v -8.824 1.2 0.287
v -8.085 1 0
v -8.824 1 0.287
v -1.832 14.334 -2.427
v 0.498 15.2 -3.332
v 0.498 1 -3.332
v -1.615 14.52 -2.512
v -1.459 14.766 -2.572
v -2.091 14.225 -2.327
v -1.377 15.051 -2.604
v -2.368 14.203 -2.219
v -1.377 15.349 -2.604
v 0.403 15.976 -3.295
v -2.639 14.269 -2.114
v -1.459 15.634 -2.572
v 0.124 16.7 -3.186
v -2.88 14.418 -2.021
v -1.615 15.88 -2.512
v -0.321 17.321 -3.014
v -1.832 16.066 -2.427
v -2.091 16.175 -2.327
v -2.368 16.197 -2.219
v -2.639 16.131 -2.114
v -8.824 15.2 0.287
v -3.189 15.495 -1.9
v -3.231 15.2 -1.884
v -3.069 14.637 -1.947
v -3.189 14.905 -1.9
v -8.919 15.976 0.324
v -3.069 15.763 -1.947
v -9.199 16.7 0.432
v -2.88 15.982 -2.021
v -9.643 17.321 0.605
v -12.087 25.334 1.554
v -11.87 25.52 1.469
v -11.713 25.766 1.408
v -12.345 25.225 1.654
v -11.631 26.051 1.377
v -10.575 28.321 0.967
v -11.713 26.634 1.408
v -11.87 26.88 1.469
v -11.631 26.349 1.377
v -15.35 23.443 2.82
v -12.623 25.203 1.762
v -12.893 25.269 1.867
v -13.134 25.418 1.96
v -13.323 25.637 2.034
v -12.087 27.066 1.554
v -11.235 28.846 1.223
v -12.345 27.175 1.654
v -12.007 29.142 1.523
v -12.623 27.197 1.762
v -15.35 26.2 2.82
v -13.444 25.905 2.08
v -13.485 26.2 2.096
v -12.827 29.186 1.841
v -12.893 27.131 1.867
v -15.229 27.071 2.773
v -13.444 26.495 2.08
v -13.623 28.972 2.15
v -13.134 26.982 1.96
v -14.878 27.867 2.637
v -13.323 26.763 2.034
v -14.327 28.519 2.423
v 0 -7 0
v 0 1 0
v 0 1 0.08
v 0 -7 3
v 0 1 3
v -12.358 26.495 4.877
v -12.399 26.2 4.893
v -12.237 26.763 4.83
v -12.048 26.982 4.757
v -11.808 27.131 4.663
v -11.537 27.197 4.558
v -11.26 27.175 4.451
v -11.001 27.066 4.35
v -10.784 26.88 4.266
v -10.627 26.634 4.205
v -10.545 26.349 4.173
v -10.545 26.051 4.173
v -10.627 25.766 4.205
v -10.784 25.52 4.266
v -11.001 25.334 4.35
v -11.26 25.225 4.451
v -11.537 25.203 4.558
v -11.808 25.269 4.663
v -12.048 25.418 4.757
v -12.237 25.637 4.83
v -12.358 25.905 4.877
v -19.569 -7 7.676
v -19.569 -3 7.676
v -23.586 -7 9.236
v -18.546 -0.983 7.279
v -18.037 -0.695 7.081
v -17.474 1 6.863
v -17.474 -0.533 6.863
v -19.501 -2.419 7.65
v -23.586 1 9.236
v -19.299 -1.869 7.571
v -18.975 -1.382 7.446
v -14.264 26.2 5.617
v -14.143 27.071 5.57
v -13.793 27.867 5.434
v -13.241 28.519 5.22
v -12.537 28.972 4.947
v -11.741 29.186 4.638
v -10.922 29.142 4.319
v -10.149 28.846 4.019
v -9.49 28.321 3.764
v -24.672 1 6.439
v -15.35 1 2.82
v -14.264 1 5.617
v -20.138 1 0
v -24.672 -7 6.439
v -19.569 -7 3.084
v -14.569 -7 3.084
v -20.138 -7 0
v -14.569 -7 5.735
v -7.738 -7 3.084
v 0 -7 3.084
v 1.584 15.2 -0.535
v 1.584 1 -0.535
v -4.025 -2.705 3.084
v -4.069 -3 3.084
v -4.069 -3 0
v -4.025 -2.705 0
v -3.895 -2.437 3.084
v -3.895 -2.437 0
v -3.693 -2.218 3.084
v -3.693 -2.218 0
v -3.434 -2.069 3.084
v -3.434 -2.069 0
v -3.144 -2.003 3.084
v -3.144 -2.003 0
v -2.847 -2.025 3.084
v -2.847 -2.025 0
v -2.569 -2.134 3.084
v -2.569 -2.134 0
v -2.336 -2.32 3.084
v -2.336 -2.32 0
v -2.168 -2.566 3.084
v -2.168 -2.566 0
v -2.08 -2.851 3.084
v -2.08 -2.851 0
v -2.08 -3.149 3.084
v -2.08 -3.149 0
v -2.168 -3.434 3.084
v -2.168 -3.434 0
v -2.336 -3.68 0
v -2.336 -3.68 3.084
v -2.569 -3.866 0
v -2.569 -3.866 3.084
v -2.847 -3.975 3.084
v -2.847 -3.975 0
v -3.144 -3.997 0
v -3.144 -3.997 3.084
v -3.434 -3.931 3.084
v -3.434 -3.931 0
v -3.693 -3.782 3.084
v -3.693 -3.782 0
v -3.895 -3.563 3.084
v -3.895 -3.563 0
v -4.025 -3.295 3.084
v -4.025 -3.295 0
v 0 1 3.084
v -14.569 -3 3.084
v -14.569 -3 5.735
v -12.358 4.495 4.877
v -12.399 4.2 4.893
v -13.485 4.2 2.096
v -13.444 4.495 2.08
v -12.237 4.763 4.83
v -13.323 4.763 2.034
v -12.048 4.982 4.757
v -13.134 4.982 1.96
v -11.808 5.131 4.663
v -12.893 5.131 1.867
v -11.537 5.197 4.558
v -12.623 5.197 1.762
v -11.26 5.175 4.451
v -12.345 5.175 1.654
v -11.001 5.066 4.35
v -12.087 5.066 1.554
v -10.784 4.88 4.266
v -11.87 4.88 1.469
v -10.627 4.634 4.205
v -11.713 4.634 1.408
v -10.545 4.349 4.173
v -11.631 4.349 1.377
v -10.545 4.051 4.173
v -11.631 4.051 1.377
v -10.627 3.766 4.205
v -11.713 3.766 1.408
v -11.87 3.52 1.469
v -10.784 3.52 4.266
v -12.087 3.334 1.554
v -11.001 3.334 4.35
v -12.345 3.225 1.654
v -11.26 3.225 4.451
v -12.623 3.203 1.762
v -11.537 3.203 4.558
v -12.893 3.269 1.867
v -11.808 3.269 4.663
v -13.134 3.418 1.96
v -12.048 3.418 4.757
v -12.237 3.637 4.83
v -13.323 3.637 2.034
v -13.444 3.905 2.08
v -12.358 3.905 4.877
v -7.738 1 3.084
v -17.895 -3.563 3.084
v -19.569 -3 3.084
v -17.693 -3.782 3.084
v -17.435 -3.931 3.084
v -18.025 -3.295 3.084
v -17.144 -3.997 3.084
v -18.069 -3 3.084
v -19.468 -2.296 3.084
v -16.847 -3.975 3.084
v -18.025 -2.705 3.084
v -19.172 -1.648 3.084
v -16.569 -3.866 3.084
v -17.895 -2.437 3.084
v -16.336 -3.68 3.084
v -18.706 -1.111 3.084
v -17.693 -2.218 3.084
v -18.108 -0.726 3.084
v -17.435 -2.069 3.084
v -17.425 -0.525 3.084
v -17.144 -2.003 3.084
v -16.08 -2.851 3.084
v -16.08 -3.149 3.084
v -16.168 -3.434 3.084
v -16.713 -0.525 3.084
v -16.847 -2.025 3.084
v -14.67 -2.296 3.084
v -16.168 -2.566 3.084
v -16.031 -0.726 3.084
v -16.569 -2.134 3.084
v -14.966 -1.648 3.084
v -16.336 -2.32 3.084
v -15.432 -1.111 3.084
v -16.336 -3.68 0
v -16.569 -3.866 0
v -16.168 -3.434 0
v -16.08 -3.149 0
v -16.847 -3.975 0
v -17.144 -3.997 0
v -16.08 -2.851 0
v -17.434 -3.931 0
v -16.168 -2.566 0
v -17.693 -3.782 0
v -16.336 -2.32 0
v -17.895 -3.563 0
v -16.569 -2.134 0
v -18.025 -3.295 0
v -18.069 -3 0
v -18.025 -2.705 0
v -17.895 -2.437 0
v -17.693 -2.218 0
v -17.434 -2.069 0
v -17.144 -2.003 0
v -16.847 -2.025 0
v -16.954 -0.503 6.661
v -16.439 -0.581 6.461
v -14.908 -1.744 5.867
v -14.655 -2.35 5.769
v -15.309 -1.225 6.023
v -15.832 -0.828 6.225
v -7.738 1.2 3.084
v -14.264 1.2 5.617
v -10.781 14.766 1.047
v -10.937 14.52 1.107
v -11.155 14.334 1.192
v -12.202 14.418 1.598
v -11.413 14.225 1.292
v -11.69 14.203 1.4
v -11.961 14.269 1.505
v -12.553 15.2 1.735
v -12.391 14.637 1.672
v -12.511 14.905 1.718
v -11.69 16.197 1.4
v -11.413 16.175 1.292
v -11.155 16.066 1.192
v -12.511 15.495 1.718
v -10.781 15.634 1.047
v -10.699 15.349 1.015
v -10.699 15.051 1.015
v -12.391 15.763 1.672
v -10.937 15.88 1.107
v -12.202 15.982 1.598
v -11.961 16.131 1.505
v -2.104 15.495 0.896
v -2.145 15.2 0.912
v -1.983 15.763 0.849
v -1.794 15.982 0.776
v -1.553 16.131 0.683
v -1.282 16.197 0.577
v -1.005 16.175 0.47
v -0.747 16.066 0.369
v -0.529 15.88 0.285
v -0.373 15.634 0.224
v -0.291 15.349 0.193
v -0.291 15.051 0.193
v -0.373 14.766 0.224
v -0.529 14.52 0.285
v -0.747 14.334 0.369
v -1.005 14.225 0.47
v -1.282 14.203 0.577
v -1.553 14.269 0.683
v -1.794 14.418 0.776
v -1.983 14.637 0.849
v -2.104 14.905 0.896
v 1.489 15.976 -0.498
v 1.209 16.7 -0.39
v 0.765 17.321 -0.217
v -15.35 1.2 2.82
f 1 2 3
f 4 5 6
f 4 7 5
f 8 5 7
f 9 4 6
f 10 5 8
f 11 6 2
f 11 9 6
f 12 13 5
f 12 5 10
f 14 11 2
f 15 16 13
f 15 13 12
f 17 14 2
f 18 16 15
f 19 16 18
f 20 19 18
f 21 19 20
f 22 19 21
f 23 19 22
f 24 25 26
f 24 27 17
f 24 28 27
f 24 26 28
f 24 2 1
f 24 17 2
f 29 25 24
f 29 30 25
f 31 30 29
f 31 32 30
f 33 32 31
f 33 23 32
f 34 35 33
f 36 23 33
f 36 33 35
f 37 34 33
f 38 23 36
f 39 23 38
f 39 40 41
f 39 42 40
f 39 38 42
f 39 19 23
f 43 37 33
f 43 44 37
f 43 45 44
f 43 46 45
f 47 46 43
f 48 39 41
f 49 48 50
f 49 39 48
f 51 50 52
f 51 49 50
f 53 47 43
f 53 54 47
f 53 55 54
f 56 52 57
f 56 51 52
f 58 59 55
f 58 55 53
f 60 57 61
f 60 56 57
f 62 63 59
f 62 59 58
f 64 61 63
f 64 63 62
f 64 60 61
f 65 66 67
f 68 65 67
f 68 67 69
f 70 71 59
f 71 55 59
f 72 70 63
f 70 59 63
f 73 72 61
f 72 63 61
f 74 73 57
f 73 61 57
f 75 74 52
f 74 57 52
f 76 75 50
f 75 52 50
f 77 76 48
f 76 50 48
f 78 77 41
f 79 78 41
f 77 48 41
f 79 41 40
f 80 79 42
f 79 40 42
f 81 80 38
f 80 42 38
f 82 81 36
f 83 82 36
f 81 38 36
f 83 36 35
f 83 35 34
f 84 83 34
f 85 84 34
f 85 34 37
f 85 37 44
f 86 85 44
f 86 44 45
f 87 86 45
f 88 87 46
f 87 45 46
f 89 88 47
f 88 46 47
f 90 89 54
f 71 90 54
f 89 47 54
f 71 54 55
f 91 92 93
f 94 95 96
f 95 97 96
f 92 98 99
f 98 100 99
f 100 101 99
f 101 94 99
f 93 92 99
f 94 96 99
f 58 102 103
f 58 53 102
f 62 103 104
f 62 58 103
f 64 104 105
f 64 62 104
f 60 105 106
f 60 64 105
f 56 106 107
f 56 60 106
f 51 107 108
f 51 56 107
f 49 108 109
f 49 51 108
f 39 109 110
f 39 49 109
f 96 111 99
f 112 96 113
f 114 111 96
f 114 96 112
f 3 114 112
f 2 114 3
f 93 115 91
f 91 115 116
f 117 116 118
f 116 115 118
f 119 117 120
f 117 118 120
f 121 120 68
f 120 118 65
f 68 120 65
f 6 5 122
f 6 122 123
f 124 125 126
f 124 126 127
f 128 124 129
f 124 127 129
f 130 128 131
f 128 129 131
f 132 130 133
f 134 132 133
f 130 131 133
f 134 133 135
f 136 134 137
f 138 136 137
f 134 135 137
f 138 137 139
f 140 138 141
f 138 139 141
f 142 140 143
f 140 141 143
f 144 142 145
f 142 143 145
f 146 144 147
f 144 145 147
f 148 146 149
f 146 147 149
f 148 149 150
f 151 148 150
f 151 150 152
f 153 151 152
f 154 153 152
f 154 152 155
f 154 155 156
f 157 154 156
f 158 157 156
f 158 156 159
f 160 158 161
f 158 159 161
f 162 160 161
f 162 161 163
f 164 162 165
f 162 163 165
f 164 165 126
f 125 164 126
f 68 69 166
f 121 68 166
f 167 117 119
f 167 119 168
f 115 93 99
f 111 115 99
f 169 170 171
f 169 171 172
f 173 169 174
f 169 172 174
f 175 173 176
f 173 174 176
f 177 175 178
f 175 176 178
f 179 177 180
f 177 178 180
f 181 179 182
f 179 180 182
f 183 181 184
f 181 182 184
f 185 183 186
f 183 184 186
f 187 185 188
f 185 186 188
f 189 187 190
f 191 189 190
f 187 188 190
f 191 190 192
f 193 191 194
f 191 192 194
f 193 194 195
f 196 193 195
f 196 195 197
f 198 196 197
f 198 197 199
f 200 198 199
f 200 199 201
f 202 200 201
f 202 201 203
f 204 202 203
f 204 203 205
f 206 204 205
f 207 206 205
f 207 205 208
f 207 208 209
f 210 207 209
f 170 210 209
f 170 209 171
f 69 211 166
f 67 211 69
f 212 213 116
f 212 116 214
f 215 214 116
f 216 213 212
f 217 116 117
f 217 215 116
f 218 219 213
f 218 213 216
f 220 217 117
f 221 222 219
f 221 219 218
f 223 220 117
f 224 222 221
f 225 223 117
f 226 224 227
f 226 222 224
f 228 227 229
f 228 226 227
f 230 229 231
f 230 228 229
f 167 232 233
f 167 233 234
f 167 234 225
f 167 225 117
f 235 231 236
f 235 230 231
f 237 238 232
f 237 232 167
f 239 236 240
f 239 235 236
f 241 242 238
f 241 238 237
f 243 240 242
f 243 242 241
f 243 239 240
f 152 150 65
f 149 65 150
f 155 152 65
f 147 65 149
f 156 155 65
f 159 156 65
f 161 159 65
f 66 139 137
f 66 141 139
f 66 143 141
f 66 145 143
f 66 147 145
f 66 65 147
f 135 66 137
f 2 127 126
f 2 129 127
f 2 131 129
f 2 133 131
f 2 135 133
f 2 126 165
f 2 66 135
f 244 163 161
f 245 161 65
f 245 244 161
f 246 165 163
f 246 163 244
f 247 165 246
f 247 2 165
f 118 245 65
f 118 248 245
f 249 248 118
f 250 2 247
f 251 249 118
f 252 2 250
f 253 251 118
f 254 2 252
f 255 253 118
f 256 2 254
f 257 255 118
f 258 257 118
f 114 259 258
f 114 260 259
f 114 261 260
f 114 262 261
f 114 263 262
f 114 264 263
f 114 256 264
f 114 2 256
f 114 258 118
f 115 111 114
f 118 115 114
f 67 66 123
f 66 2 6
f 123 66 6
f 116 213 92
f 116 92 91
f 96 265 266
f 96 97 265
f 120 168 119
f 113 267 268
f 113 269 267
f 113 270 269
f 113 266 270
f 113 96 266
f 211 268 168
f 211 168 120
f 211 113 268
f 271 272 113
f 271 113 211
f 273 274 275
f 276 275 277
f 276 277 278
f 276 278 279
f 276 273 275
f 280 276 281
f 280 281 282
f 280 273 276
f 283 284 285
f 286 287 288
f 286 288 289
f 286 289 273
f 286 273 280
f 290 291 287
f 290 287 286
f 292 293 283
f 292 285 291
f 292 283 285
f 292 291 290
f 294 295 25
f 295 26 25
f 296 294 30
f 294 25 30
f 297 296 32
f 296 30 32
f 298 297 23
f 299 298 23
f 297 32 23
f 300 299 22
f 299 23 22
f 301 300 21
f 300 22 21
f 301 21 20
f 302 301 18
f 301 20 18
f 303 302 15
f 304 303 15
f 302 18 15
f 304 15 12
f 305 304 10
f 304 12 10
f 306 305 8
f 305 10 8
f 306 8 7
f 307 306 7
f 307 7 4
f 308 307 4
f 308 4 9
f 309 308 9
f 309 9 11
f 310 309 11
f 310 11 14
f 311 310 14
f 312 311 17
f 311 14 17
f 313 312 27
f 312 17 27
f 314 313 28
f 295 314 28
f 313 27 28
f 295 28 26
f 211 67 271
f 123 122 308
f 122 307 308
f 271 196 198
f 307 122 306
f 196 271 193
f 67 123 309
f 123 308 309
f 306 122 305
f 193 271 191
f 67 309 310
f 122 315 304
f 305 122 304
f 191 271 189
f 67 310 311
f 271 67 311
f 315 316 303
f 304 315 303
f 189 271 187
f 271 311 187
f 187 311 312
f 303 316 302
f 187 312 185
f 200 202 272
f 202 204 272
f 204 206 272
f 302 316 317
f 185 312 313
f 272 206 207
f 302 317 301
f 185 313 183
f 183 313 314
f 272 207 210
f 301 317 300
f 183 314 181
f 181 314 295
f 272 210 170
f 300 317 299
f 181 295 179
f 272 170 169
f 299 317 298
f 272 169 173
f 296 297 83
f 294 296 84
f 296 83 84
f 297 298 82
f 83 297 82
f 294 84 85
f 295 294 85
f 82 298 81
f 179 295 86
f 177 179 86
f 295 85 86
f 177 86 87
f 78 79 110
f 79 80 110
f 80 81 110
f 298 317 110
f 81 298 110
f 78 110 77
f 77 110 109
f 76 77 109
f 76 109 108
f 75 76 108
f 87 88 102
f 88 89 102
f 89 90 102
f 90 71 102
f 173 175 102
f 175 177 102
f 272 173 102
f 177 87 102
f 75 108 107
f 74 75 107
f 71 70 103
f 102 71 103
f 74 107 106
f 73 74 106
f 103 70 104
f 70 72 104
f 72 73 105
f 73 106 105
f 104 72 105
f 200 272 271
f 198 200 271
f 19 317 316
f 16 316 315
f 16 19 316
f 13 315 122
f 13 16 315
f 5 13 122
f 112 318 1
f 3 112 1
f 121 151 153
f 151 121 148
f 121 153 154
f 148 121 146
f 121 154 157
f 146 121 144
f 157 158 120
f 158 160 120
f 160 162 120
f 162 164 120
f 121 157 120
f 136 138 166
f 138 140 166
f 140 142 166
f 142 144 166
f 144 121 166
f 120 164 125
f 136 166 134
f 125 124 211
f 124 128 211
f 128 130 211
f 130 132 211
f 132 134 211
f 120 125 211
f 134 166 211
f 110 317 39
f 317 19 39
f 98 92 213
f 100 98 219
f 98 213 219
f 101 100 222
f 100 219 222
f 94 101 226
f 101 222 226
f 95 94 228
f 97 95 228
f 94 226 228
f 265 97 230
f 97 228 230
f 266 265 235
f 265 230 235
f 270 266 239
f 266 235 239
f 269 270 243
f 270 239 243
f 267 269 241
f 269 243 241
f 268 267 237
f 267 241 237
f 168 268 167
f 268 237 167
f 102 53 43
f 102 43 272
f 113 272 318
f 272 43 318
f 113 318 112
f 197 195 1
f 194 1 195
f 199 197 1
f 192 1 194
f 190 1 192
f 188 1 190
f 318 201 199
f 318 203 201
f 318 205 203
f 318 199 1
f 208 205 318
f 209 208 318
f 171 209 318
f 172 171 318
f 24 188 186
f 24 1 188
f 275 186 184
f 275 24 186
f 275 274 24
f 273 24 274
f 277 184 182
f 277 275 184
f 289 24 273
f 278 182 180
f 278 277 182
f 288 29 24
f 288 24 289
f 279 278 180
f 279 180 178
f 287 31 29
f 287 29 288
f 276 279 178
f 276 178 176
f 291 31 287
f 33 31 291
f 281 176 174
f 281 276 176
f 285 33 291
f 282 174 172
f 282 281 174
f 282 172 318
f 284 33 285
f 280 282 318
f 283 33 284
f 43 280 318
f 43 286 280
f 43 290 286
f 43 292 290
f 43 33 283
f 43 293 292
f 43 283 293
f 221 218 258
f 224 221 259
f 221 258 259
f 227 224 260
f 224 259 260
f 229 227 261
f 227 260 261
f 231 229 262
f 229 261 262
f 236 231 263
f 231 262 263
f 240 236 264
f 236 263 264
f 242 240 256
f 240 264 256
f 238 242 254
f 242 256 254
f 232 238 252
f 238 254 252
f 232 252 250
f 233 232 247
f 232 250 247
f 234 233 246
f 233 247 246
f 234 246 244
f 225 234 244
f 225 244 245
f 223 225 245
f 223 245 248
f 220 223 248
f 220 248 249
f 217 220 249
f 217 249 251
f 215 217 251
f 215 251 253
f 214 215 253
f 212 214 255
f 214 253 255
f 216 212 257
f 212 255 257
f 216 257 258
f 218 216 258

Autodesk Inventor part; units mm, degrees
ref_plane "YZ Plane" through (0, 0, 0) normal (1, 0, 0) x (0, 1, 0)
ref_plane "XZ Plane" through (0, 0, 0) normal (0, 1, 0) x (-1, 0, 0)
ref_plane "Work Plane1" through (-20.7895, 15.2, 8.1501) normal (-0.3618889, 0, -0.9322212) x (-0.9322212, 0, 0.3618889)
sketch "Sketch2" plane through (-20.7895, 15.2, 8.1501) normal (-0.3618889, 0, -0.9322212) x (-0.9322212, 0, 0.3618889)
  circle A0 centre (-11, 0) radius 1 projected
  circle A1 centre (0, 11) radius 1 projected
  circle A2 centre (0, -11) radius 1 projected
  circle A3 centre (-11, 0) radius 3
  circle A4 centre (0, 11) radius 3
  circle A5 centre (0, -11) radius 3
  line L0 (0, 11) -> (3, 11)
  line L1 (0, -11) -> (3, -11)
  line L2 (3, -11) -> (3, 11)
  line L3 (0, 11) -> (-2.1213, 13.1213)
  line L4 (-2.1213, 13.1213) -> (-13.1213, 2.1213)
  line L5 (-13.1213, 2.1213) -> (-11, 0)
  line L6 (3, -11) -> (3, -14)
  line L7 (3, -14) -> (-14, -14)
  line L8 (-14, -14) -> (-14, 0)
  point P0 (-22.3298, -15.2)
  dimension "d6" = 6
  dimension "d4" = 6
  dimension "d5" = 6
  dimension "d7" = 3
extrude "Extrusion1" add sketch "Sketch2" along normal blind 3 contours A0 | L0 L3 A1 | L0 A4 L3 A1 | A1 L3 L0 | A1 L3 A4 L0 | L2 A5 L7 L8 A3 L4 A4 | A5 | L6 L7 A5 | A3 | A2
sketch "Sketch4" plane through (-23.5861, 1.2, 9.2357) normal (0, -1, 0) x (0.9322212, 0, -0.3618889)
  line L0 (25.9951, -3.0341) -> (28.4579, -2.8567) projected
  line L1 (27.3233, 0.0694) -> (28.4579, -2.8567) projected
  line L2 (27.3233, 0.0694) -> (25.3298, -0.0742) projected
  line L3 (25.3298, -0.0742) -> (6.5565, -7.362) projected
  line L4 (6.5565, -7.362) -> (-4.0222, -15.9035) projected
  line L5 (-2.8836, -18.8399) -> (-4.0222, -15.9035) projected
  line L6 (-2.8836, -18.8399) -> (8.0776, -9.9896) projected
  line L7 (8.0776, -9.9896) -> (25.9951, -3.0341) projected
  line L8 (17, 0) -> (0, 0) projected
  line L9 (0, 0) -> (0, -3) projected
  line L10 (17, -3) -> (0, -3) projected
  line L11 (17, 0) -> (17, -3) projected
  line L12 (6.5565, -7.362) -> (6.5565, 0)
  line L13 (17, 0) -> (0, 0) projected
  line L14 (25.3298, -0.0742) -> (24.2441, 2.7225)
  line L15 (24.2441, 2.7225) -> (17.2311, 0)
  line L16 (17, 0) -> (17, -3) projected
  line L17 (17, 0) -> (17.2311, 0)
  point P0 (6.5565, 0)
  dimension "d11" = 3
ref_plane "Work Plane2" through (-35.5643, -7, -23.7485) normal (0, -1, 0) x (0.7068322, 0, -0.7073813)
extrude "Extrusion2" add sketch "Sketch4" along normal up to surface (8.2 mm away) contours L3 L12 L10 L11 L17 L15 L14 | L12 L8 L11 L10
sketch "Sketch5" plane through (-23.5861, 1.2, 9.2357) normal (0, 1, 0) x (0.9322212, 0, -0.3618889)
  line L0 (17, 0) -> (17, 3) projected
  line L1 (17.2311, 0) -> (17, 0) projected
  line L2 (24.2441, -2.7225) -> (17.2311, 0) projected
  line L3 (25.3298, 0.0742) -> (24.2441, -2.7225) projected
  line L4 (6.5565, 7.362) -> (25.3298, 0.0742) projected
  line L5 (6.5565, 3) -> (6.5565, 7.362) projected
  line L6 (17, 3) -> (6.5565, 3) projected
  line L7 (24.2441, -2.7225) -> (17.2311, 0) projected
  line L8 (24.2441, -2.7225) -> (24.2139, -2.8004)
  line L9 (24.2139, -2.8004) -> (17, 0)
  point P0 (25.3298, 0.0742)
extrude "Extrusion3" add sketch "Sketch5" against normal up to surface (8.2 mm away) contours L1 L2 L8 L9
sketch "Sketch6" plane through (-24.6718, 1.2, 6.4391) normal (0, -1, 0) x (0.9322212, 0, -0.3618889)
  line L0 (6.5565, 0) -> (6.5565, 3) projected
  line L1 (6.5565, 3) -> (0, 3) projected
  line L2 (0, 3) -> (0, 0) projected
  line L3 (6.5565, 0) -> (0, 0) projected
  line L4 (6.5565, -4.362) -> (6.5565, 3) projected
  line L5 (6.5565, 0) -> (0, 0) projected
  line L6 (6.5565, 0) -> (6.5565, -4.362) projected
  line L7 (0, 0) -> (6.5565, -4.362)
  point P0 (25.3298, 2.9258)
extrude "Extrusion4" add sketch "Sketch6" along normal up to surface (8.2 mm away)
sketch "Sketch7" plane through (0, -7, 0) normal (0, 0, -1) x (-1, 0, 0)
  circle A0 centre (3.0691, 4) radius 1.6 projected
  circle A1 centre (17.0691, 4) radius 1.6 projected
  circle A2 centre (3.0691, 4) radius 1.6 projected
  line L0 (20.1383, 8) -> (0, 8) projected
  line L1 (20.1383, 8) -> (20.1383, 0) projected
  line L2 (0, 0) -> (20.1383, 0) projected
  line L3 (0, 8) -> (0, 0) projected
  circle A3 centre (3.0691, 4) radius 1
  circle A4 centre (17.0691, 4) radius 1
  point P0 (0, 7)
  dimension "d21" = 2
  dimension "d22" = 2
extrude "Extrusion5" cut sketch "Sketch7" against normal blind 10 contours A3 | A4
ref_plane "Work Plane3" through (-7.7384, 1.2, 3.0836) normal (0, 0, 1) x (1, 0, 0)
sketch "Sketch8" plane through (-7.7384, 1.2, 3.0836) normal (0, 0, 1) x (1, 0, 0)
  circle A0 centre (-9.3308, -4.2) radius 1 projected
  line L0 (-9.3308, -4.2) -> (-9.3308, -11.2) construction
  line L1 (-11.8308, -4.2) -> (-11.8308, -11.2)
  line L2 (-6.8308, -11.2) -> (-6.8308, -4.2)
  arc A1 (-6.8308, -4.2) -> (-11.8308, -4.2) centre (-9.3308, -4.2) ccw
  arc A2 (-11.8308, -11.2) -> (-6.8308, -11.2) centre (-9.3308, -11.2) ccw
  point P0 (7.7384, -1.2)
  point P1 (-9.3308, -7.7)
  dimension "d26" = 7
  dimension "d27" = 5
extrude "Extrusion6" cut sketch "Sketch8" along normal blind 10
sketch "Sketch9" plane through (-21.8751, 15.2, 5.3534) normal (-0.3618889, 0, -0.9322212) x (-0.9322212, 0, 0.3618889)
  circle A0 centre (-11, 0) radius 1 projected
  circle A1 centre (0, 11) radius 1 projected
  circle A2 centre (0, -11) radius 1 projected
  circle A3 centre (0, -11) radius 1
  circle A4 centre (-11, 0) radius 1
  circle A5 centre (0, 11) radius 1
  point P0 (-22.3298, -15.2)
  dimension "d30" = 2
  dimension "d31" = 2
  dimension "d32" = 2
extrude "Extrusion7" cut sketch "Sketch9" against normal blind 10
thicken "Thicken1" operation add thickness 0.2 both sides no extend neighbours yes toward (0, -1, 0) faces at (-17.878, 1.2, 2.242)
sketch "Sketch13" plane through (-21.8751, 15.2, 5.3534) normal (-0.3618889, 0, -0.9322212) x (-0.9322212, 0, 0.3618889)
  line L0 (3, -14.2) -> (3, 11) projected
  arc A0 (3, 11) -> (-2.1213, 13.1213) centre (0, 11) ccw projected
  line L1 (-2.1213, 13.1213) -> (-13.1213, 2.1213) projected
  arc A1 (-13.1213, 2.1213) -> (-14, 0) centre (-11, 0) ccw projected
  line L2 (-14, 0) -> (-14, -14.2) projected
  line L3 (-14, -14.2) -> (3, -14.2) projected
  circle A2 centre (-11, 0) radius 1 projected
  circle A3 centre (0, 11) radius 1 projected
  circle A4 centre (0, -11) radius 1 projected
  line L4 (0, -11) -> (-10, -11)
  line L5 (-11, 0) -> (-21, 0)
  line L6 (0, 11) -> (-10, 11)
  circle A5 centre (-21, 0) radius 3
  circle A6 centre (-10, -11) radius 3
  circle A7 centre (-10, 11) radius 3
  line L7 (-10, 11) -> (-10, 14)
  circle A8 centre (0, 11) radius 1 projected
  line L8 (0, 11) -> (0, 14)
  arc A9 (3, 11) -> (-2.1213, 13.1213) centre (0, 11) ccw projected
  line L9 (0, 14) -> (-10, 14)
  line L10 (-10, 11) -> (-12.1213, 13.1213)
  line L11 (-21, 0) -> (-23.1213, 2.1213)
  line L12 (-23.1213, 2.1213) -> (-12.1213, 13.1213)
  line L13 (-21, 0) -> (-24, 0)
  line L14 (-3.5565, -14.2) -> (-22.3298, -14.2) projected
  line L15 (-24, 0) -> (-24, -14.2)
  line L16 (-22.3298, -14.2) -> (-24, -14.2)
  point P0 (-22.3298, -15.2)
  dimension "d57" = 10
  dimension "d58" = 10
  dimension "d59" = 10
  dimension "d60" = 6
  dimension "d61" = 6
  dimension "d62" = 6
extrude "Extrusion11" add sketch "Sketch13" against normal up to surface (3 mm away) contours A0 L1 L6 A7 L9 | L14 L16 L15 A5 L5 L2 | L7 L10 A7 | A7 L6 L7 | L5 A5 L12 A7 L6 L1 A1 | A7 L10 L6 | A5 L13 L5 | L5 L11 A5 | L11 L13 A5
sketch "Sketch14" plane through (-21.8751, 15.2, 5.3534) normal (-0.3618889, 0, -0.9322212) x (-0.9322212, 0, 0.3618889)
  line L0 (3, -14.2) -> (3, 11) projected
  arc A0 (3, 11) -> (0, 14) centre (0, 11) ccw projected
  line L1 (0, 14) -> (-10, 14) projected
  arc A1 (-10, 14) -> (-12.1213, 13.1213) centre (-10, 11) ccw projected
  line L2 (-12.1213, 13.1213) -> (-23.1213, 2.1213) projected
  arc A2 (-23.1213, 2.1213) -> (-24, 0) centre (-21, 0) ccw projected
  line L3 (-24, 0) -> (-24, -14.2) projected
  line L4 (-24, -14.2) -> (-14.793, -14.2) projected
  line L5 (3, -14.2) -> (-14.793, -14.2) projected
  circle A3 centre (-11, 0) radius 1 projected
  circle A4 centre (0, 11) radius 1 projected
  circle A5 centre (0, -11) radius 1 projected
  circle A6 centre (-21, 0) radius 1
  circle A7 centre (0, -11) radius 1 projected
  line L6 (0, -11) -> (-10, -11)
  circle A8 centre (-10, -11) radius 1
  circle A9 centre (0, 11) radius 1 projected
  line L7 (0, 11) -> (-10, 11)
  circle A10 centre (-10, 11) radius 1
  point P0 (-22.3298, -15.2)
  dimension "d65" = 2
  dimension "d66" = 10
  dimension "d67" = 2
  dimension "d68" = 10
  dimension "d69" = 2
extrude "Extrusion12" cut sketch "Sketch14" against normal blind 4 contours A6 | A8 | A10
sketch "Sketch15" plane through (-21.8751, 15.2, 5.3534) normal (-0.3618889, 0, -0.9322212) x (-0.9322212, 0, 0.3618889)
  circle A0 centre (-10, 11) radius 1 projected
  circle A1 centre (-10, -11) radius 1 projected
  circle A2 centre (-21, 0) radius 1 projected
  line L0 (3, -14.2) -> (3, 11) projected
  arc A3 (3, 11) -> (0, 14) centre (0, 11) ccw projected
  line L1 (0, 14) -> (-10, 14) projected
  arc A4 (-10, 14) -> (-12.1213, 13.1213) centre (-10, 11) ccw projected
  line L2 (-12.1213, 13.1213) -> (-23.1213, 2.1213) projected
  arc A5 (-23.1213, 2.1213) -> (-24, 0) centre (-21, 0) ccw projected
  line L3 (-24, 0) -> (-24, -14.2) projected
  line L4 (-24, -14.2) -> (-14.793, -14.2) projected
  line L5 (3, -14.2) -> (-14.793, -14.2) projected
  circle A6 centre (-11, 0) radius 1 projected
  circle A7 centre (0, 11) radius 1 projected
  circle A8 centre (0, -11) radius 1 projected
  point P0 (-22.3298, -15.2)
extrude "Extrusion13" add sketch "Sketch15" against normal up to surface (3 mm away) contours A6 | A7 | A8
sketch "Sketch16" plane through (-21.8751, 15.2, 5.3534) normal (-0.3618889, 0, -0.9322212) x (-0.9322212, 0, 0.3618889)
  circle A0 centre (-10, 11) radius 1 projected
  circle A1 centre (-10, -11) radius 1 projected
  circle A2 centre (-21, 0) radius 1 projected
  line L0 (3, -14.2) -> (3, 11) projected
  arc A3 (3, 11) -> (0, 14) centre (0, 11) ccw projected
  line L1 (0, 14) -> (-10, 14) projected
  arc A4 (-10, 14) -> (-12.1213, 13.1213) centre (-10, 11) ccw projected
  line L2 (-12.1213, 13.1213) -> (-23.1213, 2.1213) projected
  arc A5 (-23.1213, 2.1213) -> (-24, 0) centre (-21, 0) ccw projected
  line L3 (-24, 0) -> (-24, -14.2) projected
  line L4 (-24, -14.2) -> (-14.793, -14.2) projected
  line L5 (3, -14.2) -> (-14.793, -14.2) projected
  circle A6 centre (-10, 11) radius 3
  circle A7 centre (-10, 11) radius 1 projected
  line L6 (-10, 11) -> (-7, 11)
  line L7 (-7, 11) -> (-7, -14.2)
  line L8 (3, -14.2) -> (-14.793, -14.2) projected
  point P0 (-22.3298, -15.2)
  point P1 (-10, 14)
  dimension "d74" = 6
extrude "Extrusion14" cut sketch "Sketch16" against normal blind 4 contours L5 L7 A6 L1 A3 L0
properties part number "jc_conn_1"
